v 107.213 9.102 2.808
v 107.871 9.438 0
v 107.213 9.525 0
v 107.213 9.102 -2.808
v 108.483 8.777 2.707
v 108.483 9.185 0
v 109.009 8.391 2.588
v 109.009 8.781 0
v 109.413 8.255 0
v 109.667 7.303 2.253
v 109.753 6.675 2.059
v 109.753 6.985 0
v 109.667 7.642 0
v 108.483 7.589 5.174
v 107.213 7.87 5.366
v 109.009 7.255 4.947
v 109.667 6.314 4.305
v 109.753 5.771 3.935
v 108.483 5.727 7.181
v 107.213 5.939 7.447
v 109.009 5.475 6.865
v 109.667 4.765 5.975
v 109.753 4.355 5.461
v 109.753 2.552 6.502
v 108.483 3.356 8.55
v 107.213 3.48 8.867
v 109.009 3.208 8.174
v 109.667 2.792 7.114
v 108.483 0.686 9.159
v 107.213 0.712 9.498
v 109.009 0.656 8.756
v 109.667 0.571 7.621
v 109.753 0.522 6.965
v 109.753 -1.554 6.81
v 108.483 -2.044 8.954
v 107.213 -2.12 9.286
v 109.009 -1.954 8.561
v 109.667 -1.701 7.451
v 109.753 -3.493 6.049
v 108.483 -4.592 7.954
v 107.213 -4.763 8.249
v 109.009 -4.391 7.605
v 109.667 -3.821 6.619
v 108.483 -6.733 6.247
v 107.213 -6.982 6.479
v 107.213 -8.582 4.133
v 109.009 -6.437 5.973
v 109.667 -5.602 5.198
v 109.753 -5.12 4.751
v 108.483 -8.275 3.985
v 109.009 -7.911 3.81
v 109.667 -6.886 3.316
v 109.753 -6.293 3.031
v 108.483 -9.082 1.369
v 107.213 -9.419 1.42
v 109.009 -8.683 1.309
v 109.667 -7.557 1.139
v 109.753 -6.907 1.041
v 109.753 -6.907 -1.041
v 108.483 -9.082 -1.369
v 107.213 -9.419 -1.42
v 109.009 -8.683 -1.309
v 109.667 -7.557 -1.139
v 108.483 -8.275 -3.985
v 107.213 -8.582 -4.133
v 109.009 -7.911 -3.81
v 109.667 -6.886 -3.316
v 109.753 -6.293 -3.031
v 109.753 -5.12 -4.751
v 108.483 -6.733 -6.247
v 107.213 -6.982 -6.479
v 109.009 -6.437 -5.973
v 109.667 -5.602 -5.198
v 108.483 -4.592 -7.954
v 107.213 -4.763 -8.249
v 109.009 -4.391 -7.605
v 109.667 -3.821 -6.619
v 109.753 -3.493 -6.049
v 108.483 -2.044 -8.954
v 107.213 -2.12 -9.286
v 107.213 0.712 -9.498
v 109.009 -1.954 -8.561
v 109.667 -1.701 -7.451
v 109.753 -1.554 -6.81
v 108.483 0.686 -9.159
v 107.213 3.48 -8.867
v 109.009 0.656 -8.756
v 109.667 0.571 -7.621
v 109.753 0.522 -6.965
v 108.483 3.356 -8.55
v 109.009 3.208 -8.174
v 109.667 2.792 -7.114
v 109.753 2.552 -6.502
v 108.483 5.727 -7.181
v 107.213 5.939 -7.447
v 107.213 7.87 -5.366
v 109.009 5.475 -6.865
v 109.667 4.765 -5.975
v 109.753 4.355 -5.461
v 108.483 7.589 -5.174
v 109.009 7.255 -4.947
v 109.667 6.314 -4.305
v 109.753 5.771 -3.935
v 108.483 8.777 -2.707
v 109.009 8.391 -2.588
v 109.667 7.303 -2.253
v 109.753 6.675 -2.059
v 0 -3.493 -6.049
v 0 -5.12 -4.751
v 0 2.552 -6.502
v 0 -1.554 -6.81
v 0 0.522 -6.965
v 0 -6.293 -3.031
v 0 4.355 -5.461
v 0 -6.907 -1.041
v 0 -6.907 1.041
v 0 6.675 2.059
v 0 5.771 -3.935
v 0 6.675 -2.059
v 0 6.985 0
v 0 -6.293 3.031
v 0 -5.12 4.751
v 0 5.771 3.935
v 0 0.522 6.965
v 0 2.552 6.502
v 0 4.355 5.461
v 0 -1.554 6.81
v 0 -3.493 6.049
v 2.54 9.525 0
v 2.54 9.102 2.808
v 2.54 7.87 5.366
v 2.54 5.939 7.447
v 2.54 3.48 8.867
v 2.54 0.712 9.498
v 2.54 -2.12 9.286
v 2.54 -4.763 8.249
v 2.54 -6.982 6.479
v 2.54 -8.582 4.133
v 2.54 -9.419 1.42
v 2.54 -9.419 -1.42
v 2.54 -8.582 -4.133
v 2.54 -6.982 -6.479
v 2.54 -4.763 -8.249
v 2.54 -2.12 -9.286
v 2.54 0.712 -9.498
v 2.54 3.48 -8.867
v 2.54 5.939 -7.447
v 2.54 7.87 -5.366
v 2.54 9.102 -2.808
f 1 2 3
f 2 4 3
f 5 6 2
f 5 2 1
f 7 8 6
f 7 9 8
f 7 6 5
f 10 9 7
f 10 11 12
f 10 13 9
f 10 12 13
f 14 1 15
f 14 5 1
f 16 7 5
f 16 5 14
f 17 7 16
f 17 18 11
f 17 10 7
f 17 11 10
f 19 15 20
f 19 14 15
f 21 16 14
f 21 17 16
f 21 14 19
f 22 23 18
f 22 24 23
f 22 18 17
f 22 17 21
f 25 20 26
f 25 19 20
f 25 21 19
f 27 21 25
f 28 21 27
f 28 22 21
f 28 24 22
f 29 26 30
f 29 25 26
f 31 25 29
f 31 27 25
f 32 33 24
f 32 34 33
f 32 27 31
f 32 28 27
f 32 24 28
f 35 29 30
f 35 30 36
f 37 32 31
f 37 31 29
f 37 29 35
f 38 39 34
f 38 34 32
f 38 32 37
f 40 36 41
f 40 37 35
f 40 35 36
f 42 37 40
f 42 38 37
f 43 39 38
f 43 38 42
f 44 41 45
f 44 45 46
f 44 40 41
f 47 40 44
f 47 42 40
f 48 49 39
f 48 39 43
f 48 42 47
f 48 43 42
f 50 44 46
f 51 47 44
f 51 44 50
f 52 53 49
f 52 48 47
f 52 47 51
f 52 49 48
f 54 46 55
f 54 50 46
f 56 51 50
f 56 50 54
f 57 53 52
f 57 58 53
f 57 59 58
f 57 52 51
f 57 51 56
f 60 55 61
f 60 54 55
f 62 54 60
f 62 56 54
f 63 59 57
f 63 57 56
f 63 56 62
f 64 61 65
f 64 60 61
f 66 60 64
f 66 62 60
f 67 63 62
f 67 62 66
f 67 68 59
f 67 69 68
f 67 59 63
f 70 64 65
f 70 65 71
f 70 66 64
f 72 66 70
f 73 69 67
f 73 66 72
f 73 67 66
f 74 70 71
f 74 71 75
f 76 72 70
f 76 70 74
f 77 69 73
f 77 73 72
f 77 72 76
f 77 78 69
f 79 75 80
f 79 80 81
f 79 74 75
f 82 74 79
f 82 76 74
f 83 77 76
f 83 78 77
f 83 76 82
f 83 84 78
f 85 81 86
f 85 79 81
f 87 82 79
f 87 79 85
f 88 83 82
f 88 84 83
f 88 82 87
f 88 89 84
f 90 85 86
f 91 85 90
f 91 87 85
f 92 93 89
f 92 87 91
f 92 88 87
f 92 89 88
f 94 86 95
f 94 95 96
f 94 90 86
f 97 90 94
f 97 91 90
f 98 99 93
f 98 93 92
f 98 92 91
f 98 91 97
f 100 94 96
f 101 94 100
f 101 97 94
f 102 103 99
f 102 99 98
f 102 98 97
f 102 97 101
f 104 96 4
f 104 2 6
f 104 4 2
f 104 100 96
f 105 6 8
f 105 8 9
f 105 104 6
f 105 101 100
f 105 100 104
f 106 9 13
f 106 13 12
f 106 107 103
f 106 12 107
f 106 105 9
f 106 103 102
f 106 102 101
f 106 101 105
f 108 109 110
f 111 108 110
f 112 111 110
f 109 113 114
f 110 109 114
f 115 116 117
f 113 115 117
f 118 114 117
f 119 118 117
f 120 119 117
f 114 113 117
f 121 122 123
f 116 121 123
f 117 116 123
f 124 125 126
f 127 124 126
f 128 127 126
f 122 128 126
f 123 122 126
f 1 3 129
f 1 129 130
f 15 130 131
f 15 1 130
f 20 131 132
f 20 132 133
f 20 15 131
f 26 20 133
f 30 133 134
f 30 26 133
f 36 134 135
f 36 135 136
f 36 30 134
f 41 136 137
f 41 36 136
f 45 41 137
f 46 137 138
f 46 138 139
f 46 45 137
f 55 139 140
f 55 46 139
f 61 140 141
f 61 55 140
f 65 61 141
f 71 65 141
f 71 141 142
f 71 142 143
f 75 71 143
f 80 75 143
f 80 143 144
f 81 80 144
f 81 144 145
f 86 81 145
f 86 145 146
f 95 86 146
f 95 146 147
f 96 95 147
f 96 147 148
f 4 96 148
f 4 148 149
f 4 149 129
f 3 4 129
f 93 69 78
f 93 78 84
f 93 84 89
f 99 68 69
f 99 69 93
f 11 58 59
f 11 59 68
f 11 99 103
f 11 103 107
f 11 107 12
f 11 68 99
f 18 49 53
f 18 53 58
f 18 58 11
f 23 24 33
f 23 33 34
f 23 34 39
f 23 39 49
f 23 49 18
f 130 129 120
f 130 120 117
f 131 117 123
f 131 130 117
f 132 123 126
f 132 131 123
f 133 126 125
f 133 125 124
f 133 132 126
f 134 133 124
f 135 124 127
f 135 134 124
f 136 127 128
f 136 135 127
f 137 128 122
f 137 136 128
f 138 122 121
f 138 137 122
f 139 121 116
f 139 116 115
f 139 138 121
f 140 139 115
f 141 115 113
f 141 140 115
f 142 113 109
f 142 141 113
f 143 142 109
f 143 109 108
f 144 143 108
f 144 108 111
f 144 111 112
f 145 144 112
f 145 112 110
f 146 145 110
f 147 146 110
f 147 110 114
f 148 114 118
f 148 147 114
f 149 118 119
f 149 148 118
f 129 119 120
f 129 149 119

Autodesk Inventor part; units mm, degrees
ref_plane "Start Plane" through (0, 0, 0) normal (1, 0, 0) x (0, 1, 0)
ref_plane "XZ Plane" through (0, 0, 0) normal (0, 1, 0) x (-1, 0, 0)
ref_plane "XY Plane" through (0, 0, 0) normal (0, 0, 1) x (1, 0, 0)
sketch "Main Sketch" plane through (0, 0, 0) normal (0, 0, 1) x (1, 0, 0)
  line L0 (0, 0) -> (109.7534, 0)
  line L1 (0, 0) -> (0, 9.525)
  line L2 (109.7534, 9.525) -> (109.7534, 0)
  line L3 (0, 9.525) -> (109.7534, 9.525)
  dimension "d3" = 19.05
revolve "Revolution1" add sketch "Main Sketch" angle 360 about axis through (0, 0, 0) along (1, 0, 0)
chamfer "Chamfer1" distance 2.54 angle 45 1 edges at (0, -9.525, 0) measured on face at (73.1689, 9.4941, -0.7664)
fillet "Fillet1" radius 2.54 1 edges at (109.7534, -9.525, 0)
properties part number "Shaft" material "Steel"
